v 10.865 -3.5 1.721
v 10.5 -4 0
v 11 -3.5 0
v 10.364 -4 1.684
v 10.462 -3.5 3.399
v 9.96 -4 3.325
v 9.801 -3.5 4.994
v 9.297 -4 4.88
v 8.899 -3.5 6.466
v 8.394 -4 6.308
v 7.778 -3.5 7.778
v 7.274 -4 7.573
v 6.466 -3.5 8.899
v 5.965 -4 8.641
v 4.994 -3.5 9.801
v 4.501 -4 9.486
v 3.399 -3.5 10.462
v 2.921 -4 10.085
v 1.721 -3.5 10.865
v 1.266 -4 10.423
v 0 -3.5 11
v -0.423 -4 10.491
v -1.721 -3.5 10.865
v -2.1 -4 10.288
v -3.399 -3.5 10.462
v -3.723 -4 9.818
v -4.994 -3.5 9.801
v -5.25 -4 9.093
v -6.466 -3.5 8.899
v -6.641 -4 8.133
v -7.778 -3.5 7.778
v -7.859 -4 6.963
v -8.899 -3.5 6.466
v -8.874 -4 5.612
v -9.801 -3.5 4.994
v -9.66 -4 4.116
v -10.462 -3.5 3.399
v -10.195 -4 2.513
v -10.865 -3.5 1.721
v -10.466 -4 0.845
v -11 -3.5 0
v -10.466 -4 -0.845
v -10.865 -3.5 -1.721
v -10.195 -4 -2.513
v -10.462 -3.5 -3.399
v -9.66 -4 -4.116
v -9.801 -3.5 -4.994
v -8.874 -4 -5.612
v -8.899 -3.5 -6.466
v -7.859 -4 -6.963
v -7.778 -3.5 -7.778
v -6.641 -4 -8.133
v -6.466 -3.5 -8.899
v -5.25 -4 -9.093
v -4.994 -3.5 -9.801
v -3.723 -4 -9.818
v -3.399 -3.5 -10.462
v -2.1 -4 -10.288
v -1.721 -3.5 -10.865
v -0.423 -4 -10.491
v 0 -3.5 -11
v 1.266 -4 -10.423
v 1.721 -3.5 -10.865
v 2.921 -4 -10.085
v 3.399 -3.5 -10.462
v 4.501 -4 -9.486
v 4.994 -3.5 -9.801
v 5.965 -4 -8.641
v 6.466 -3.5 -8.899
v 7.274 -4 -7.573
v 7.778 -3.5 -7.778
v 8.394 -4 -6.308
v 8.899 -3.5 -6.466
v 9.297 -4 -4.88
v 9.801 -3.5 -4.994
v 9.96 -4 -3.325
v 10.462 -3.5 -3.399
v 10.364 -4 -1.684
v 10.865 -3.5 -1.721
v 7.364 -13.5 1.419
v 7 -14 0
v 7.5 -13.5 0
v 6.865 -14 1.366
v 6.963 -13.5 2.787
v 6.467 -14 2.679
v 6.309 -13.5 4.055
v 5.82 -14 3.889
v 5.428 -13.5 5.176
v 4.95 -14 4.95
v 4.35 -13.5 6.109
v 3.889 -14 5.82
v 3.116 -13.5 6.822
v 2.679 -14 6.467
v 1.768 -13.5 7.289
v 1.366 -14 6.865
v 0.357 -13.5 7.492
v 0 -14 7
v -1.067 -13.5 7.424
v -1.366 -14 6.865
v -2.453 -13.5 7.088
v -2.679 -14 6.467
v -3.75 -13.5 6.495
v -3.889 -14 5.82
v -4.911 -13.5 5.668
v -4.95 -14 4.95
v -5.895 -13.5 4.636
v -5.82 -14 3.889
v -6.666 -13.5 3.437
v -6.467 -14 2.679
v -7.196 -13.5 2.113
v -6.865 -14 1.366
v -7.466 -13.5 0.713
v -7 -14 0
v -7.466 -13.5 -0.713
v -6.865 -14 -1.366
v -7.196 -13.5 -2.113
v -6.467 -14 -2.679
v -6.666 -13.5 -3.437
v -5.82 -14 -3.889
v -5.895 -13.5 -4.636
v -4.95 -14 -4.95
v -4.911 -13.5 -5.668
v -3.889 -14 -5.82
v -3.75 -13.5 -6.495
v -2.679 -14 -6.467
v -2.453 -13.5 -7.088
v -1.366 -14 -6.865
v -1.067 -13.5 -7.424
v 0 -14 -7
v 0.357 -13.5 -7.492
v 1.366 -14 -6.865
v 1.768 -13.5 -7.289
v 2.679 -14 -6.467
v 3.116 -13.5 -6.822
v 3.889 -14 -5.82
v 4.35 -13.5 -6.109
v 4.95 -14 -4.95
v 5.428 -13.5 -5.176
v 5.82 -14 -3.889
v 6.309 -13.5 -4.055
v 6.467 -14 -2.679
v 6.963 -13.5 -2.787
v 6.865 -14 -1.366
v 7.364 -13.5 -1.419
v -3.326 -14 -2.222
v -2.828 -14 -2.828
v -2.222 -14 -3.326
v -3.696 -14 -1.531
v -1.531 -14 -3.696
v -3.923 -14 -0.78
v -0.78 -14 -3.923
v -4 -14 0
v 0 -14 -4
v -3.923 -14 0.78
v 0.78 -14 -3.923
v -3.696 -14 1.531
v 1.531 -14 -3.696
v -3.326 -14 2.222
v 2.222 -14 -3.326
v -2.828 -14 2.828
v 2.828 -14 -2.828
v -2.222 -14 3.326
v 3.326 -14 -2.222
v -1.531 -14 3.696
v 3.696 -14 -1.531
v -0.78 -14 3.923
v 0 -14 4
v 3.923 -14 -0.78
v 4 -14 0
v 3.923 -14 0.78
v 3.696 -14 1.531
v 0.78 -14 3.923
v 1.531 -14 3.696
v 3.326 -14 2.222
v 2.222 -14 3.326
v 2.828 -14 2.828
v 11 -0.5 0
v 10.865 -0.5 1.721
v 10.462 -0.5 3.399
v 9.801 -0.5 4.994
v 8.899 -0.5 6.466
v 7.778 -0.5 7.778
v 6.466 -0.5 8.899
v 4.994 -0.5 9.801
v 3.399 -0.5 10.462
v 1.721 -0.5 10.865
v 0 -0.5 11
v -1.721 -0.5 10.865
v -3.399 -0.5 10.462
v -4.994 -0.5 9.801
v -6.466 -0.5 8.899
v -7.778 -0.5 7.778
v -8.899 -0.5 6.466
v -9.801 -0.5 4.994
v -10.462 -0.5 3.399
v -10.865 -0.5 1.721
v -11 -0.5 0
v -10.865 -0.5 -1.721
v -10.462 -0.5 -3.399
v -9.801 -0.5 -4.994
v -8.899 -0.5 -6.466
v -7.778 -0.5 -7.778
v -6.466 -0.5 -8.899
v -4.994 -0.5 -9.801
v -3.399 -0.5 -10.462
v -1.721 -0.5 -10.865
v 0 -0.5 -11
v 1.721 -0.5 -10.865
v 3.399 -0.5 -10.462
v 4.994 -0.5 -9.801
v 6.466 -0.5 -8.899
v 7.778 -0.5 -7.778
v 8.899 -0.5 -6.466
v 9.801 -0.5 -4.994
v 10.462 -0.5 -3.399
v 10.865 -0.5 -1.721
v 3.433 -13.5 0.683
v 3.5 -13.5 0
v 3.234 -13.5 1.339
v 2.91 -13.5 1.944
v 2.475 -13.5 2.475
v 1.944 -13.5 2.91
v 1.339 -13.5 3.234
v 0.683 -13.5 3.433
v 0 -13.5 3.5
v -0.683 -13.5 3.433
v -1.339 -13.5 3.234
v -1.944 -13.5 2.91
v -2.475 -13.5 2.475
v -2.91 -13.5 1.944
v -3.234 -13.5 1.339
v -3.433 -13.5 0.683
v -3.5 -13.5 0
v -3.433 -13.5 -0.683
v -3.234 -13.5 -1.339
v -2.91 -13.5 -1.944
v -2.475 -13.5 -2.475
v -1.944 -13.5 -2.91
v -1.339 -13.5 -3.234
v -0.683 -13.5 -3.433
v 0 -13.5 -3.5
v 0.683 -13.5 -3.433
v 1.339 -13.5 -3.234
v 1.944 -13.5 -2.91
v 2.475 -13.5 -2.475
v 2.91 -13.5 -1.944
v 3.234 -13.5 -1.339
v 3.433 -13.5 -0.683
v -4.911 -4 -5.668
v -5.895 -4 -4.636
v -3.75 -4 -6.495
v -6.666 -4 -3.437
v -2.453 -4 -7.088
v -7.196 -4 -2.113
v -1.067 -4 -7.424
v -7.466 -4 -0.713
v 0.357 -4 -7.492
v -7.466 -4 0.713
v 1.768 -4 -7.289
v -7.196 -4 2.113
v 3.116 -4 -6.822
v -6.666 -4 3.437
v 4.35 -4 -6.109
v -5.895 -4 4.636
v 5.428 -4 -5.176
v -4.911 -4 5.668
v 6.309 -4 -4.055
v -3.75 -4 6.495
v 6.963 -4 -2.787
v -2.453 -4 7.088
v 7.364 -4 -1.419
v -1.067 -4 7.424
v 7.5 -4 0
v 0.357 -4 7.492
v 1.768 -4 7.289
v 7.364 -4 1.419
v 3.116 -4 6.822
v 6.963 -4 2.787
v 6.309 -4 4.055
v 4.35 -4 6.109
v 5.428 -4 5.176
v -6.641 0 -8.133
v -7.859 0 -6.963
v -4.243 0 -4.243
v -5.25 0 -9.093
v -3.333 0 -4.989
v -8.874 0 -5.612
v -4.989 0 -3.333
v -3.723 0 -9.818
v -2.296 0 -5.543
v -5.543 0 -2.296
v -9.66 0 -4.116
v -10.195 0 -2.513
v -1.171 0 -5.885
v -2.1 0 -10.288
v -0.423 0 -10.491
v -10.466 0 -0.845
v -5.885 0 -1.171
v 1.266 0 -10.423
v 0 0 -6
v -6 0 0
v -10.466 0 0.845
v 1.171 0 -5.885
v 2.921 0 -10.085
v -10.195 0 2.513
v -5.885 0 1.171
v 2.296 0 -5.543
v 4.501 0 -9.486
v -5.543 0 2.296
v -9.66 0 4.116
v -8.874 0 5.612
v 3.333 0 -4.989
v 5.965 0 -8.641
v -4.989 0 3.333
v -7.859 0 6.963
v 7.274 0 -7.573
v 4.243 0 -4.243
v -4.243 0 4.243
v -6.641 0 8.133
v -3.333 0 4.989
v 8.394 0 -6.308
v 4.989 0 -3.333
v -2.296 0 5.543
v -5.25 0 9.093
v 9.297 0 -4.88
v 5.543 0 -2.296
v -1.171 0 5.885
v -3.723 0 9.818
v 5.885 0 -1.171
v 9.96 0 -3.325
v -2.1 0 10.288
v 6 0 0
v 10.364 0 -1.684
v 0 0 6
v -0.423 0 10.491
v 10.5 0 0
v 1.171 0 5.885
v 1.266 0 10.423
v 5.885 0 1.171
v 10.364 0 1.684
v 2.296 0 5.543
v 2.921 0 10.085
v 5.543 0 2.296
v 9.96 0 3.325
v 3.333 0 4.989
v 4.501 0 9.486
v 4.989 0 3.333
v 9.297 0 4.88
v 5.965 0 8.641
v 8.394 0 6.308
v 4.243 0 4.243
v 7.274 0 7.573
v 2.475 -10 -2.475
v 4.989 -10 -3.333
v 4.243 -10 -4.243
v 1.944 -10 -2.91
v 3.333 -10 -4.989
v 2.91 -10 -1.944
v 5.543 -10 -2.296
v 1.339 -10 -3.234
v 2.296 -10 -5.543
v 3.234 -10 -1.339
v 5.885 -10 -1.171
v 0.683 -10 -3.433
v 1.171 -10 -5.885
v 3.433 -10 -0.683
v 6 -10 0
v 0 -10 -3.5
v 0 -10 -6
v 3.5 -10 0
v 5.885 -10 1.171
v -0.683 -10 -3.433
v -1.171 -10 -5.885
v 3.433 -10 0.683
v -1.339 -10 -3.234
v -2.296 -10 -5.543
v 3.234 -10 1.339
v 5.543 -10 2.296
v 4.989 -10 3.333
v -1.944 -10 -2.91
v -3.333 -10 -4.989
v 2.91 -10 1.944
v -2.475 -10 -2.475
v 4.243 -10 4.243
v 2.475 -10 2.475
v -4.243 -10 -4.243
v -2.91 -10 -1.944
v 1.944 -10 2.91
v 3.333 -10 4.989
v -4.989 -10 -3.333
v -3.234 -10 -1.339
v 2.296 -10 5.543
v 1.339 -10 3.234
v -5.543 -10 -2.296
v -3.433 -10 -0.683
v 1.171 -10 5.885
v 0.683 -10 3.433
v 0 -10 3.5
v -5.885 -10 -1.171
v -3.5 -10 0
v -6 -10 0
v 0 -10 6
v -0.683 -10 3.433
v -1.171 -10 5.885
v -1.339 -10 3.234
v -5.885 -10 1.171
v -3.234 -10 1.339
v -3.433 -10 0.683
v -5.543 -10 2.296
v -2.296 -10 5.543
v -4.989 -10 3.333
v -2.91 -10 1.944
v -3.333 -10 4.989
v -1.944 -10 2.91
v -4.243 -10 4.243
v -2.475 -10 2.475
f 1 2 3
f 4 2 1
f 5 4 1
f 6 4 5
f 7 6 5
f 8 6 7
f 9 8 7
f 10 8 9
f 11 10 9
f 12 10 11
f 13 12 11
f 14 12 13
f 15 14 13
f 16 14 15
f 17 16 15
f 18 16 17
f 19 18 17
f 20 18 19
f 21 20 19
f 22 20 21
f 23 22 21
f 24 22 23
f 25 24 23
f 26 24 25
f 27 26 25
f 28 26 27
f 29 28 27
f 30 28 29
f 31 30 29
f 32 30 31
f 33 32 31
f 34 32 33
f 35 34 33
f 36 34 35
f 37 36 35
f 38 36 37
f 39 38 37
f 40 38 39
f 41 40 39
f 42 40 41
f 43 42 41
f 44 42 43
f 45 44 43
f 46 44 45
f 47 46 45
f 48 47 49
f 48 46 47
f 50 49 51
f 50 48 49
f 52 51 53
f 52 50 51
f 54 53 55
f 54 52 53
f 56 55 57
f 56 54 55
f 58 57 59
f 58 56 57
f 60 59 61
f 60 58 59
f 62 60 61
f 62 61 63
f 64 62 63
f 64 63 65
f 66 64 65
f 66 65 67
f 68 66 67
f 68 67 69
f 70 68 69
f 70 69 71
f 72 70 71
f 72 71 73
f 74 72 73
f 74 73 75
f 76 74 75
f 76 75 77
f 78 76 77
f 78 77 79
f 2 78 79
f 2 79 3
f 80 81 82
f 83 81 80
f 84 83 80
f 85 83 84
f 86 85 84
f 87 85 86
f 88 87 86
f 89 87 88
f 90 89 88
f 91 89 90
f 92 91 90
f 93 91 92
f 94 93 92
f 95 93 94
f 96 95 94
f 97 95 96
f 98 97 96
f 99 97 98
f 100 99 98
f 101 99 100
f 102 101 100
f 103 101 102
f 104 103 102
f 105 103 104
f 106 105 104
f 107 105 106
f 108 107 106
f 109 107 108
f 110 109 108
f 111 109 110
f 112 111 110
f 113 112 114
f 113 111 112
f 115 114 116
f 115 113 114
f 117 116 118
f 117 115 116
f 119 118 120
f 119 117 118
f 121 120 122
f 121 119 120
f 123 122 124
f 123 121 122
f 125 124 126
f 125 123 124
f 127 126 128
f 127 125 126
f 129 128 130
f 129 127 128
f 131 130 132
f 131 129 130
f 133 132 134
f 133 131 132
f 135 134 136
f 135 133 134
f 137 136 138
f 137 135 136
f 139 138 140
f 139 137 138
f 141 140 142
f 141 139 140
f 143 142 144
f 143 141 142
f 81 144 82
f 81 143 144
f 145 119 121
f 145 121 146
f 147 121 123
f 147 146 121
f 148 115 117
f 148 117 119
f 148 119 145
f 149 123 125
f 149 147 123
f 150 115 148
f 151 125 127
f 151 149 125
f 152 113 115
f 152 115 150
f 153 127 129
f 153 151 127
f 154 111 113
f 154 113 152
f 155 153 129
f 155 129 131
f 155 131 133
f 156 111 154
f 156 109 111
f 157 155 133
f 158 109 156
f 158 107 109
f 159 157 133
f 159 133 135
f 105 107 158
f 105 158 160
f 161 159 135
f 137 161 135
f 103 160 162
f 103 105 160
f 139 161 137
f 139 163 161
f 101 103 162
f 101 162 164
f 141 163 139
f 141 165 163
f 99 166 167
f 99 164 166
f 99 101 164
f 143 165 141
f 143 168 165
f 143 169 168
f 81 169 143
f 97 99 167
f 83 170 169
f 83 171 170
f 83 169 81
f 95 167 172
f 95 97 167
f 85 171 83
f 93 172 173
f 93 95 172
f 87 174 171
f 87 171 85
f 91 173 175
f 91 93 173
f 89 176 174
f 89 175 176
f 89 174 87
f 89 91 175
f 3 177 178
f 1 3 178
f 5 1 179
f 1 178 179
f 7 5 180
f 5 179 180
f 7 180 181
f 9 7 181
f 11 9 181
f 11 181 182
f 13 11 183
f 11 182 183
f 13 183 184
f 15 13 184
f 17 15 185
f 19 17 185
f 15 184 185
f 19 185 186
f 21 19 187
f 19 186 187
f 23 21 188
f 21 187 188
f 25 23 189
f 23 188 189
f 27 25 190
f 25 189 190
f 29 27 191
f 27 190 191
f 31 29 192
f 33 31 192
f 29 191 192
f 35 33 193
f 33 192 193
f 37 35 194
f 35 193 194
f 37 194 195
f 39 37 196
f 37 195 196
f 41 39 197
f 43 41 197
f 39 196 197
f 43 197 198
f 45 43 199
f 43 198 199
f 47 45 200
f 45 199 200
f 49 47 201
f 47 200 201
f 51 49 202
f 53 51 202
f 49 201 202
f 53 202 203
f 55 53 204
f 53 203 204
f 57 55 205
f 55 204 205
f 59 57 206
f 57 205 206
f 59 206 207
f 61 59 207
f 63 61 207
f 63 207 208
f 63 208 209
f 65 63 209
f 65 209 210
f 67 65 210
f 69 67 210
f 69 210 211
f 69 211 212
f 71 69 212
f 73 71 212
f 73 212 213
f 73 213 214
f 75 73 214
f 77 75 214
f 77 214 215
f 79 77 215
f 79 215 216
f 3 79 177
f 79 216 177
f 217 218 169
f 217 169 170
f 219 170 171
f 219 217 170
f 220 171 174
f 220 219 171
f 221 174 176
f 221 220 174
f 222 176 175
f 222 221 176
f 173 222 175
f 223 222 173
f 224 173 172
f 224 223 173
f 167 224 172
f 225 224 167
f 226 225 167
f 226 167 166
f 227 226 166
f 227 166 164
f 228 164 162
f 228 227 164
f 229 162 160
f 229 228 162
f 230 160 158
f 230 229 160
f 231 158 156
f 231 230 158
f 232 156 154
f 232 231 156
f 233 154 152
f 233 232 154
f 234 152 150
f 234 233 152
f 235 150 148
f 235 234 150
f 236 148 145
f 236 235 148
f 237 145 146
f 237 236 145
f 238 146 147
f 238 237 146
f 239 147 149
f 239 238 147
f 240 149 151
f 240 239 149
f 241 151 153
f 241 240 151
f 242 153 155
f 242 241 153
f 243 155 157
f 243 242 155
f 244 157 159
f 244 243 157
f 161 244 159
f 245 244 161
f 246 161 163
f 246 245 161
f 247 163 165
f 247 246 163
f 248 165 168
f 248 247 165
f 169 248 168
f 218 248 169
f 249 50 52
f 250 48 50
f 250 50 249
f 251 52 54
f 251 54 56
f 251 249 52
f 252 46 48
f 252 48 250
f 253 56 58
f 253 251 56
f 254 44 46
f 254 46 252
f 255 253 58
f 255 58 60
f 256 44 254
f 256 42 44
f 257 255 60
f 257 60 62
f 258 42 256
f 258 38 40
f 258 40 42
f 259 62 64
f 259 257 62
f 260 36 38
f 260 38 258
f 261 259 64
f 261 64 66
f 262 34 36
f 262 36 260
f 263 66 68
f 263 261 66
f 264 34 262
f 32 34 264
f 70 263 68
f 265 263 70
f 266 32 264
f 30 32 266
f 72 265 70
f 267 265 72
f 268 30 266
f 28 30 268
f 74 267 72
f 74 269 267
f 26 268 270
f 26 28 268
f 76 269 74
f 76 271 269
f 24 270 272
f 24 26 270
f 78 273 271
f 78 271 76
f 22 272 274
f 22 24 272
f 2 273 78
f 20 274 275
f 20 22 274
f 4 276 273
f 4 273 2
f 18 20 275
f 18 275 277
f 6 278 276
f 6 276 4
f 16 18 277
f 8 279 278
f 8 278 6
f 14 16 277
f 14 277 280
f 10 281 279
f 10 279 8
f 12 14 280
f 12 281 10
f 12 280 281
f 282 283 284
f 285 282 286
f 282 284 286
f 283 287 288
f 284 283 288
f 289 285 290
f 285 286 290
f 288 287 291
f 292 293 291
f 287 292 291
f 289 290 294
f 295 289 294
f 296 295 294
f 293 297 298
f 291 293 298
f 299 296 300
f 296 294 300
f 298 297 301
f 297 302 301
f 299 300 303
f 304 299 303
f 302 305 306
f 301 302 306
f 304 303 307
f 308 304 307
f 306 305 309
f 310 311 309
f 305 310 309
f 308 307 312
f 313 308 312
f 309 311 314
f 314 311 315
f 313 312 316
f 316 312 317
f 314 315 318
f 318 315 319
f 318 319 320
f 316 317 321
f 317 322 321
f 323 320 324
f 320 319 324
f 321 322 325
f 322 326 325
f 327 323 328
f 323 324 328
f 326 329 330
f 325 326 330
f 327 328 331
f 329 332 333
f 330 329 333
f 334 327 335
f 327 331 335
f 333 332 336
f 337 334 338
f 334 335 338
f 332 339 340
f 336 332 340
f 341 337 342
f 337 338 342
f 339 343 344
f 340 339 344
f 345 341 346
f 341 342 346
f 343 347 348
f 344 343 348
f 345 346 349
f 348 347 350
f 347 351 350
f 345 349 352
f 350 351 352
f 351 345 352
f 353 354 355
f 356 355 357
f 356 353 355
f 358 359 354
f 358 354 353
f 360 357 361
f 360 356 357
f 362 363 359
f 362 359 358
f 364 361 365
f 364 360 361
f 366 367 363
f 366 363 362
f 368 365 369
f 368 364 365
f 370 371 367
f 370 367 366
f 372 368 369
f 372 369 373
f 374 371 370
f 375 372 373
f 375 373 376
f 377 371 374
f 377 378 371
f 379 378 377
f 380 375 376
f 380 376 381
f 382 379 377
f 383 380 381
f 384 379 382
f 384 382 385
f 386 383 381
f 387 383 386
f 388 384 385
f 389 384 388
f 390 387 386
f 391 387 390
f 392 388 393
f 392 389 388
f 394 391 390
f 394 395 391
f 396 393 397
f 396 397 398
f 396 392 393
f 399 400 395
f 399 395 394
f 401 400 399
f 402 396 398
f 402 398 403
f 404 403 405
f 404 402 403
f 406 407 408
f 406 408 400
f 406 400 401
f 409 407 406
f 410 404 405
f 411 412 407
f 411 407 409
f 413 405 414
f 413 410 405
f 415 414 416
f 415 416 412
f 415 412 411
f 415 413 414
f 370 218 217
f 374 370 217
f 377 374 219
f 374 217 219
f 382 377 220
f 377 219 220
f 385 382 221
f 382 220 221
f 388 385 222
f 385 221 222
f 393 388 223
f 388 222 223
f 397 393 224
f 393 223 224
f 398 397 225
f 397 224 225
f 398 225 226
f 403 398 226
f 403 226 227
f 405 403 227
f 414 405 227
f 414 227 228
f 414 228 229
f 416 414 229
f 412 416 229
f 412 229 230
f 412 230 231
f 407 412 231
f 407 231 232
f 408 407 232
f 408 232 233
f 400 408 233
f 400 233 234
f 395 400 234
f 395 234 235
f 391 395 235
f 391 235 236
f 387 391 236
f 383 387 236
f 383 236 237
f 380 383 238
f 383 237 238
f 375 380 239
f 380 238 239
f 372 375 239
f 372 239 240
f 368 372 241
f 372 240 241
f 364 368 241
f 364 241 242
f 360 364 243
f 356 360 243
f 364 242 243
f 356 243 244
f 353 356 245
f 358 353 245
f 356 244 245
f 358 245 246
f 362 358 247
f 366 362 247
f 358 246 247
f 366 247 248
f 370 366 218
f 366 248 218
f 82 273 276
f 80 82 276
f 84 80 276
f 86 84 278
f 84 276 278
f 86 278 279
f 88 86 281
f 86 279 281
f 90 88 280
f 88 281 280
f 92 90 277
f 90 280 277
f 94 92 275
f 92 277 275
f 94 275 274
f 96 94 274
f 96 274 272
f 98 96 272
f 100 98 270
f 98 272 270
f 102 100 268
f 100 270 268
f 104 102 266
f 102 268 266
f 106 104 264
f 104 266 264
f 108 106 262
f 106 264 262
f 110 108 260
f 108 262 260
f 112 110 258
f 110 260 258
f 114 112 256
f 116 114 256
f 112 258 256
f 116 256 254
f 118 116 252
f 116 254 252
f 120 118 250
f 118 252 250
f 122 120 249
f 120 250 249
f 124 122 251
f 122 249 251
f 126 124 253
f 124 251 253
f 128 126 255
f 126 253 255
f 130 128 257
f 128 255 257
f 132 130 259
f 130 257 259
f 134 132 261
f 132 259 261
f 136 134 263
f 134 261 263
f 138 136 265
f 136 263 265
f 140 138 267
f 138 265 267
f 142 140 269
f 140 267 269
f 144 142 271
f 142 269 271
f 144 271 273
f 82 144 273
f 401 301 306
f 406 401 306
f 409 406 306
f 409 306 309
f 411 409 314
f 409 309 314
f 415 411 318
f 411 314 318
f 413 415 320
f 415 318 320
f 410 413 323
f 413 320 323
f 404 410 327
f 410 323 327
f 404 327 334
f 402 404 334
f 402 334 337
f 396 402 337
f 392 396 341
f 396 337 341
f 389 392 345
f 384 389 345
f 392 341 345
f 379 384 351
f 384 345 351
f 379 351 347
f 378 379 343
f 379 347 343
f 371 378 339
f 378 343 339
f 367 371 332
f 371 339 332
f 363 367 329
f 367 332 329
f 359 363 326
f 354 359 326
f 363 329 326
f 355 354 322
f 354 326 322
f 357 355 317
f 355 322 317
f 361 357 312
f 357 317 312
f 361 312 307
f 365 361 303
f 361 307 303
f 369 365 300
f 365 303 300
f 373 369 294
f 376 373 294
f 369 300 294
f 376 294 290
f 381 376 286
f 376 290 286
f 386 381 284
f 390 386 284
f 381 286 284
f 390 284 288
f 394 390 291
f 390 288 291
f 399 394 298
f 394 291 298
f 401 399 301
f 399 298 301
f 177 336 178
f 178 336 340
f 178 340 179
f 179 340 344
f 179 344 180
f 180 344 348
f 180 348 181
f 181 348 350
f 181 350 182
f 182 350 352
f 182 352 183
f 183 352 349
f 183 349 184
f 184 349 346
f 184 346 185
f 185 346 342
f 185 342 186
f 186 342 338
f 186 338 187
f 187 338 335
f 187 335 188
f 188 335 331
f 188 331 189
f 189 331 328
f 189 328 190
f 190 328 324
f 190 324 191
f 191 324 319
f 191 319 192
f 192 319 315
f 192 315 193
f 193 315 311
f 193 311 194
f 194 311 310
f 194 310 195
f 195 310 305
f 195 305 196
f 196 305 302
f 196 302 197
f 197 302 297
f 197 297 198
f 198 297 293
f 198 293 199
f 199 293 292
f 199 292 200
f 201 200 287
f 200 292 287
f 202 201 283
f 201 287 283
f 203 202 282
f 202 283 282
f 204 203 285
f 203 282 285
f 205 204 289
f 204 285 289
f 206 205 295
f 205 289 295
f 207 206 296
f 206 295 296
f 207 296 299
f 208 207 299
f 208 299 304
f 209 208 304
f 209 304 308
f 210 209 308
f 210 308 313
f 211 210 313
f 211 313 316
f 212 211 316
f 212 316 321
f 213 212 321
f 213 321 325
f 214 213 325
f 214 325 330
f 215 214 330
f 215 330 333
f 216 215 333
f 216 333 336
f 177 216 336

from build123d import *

# Parameters (mm, degrees)
F0_R     = 11
F1_DEPTH = 4
F2_R     = 7.5
F5_DEPTH = 10
F3_R     = 6
F6_DEPTH = 10
F7_R     = 3.5
F4_DEPTH = 25
F8_SIZE  = 0.5


with BuildPart() as f1:
    # F0 (on Front) → F1 (new body)
    with BuildSketch(Plane.XZ):
        Circle(F0_R)
    extrude(amount=F1_DEPTH)

    # F2 (on face) → F5 (join)
    with BuildSketch(Plane.XZ.offset(4)):
        Circle(F2_R)
    extrude(amount=F5_DEPTH)

    # F3 (on face) → F6 (cut)
    with BuildSketch(Plane(origin=(0, 0, 0), x_dir=(-1, 0, 0), z_dir=(0, 1, 0))):
        Circle(F3_R)
    extrude(amount=-F6_DEPTH, mode=Mode.SUBTRACT)

    # F7 (on face) → F4 (cut)
    with BuildSketch(Plane.XZ.offset(14)):
        Circle(F7_R)
    extrude(amount=-F4_DEPTH, mode=Mode.SUBTRACT)

    # F8
    f8_edges = [f1.edges().sort_by_distance(p)[0] for p in [
        (-7.5, -14, 0),
        (-3.5, -14, 0),
        (11, -2, 0),
        (-11, 0, 0),
        (-11, -4, 0),
    ]]
    chamfer(f8_edges, length=F8_SIZE)


solid = f1.part
